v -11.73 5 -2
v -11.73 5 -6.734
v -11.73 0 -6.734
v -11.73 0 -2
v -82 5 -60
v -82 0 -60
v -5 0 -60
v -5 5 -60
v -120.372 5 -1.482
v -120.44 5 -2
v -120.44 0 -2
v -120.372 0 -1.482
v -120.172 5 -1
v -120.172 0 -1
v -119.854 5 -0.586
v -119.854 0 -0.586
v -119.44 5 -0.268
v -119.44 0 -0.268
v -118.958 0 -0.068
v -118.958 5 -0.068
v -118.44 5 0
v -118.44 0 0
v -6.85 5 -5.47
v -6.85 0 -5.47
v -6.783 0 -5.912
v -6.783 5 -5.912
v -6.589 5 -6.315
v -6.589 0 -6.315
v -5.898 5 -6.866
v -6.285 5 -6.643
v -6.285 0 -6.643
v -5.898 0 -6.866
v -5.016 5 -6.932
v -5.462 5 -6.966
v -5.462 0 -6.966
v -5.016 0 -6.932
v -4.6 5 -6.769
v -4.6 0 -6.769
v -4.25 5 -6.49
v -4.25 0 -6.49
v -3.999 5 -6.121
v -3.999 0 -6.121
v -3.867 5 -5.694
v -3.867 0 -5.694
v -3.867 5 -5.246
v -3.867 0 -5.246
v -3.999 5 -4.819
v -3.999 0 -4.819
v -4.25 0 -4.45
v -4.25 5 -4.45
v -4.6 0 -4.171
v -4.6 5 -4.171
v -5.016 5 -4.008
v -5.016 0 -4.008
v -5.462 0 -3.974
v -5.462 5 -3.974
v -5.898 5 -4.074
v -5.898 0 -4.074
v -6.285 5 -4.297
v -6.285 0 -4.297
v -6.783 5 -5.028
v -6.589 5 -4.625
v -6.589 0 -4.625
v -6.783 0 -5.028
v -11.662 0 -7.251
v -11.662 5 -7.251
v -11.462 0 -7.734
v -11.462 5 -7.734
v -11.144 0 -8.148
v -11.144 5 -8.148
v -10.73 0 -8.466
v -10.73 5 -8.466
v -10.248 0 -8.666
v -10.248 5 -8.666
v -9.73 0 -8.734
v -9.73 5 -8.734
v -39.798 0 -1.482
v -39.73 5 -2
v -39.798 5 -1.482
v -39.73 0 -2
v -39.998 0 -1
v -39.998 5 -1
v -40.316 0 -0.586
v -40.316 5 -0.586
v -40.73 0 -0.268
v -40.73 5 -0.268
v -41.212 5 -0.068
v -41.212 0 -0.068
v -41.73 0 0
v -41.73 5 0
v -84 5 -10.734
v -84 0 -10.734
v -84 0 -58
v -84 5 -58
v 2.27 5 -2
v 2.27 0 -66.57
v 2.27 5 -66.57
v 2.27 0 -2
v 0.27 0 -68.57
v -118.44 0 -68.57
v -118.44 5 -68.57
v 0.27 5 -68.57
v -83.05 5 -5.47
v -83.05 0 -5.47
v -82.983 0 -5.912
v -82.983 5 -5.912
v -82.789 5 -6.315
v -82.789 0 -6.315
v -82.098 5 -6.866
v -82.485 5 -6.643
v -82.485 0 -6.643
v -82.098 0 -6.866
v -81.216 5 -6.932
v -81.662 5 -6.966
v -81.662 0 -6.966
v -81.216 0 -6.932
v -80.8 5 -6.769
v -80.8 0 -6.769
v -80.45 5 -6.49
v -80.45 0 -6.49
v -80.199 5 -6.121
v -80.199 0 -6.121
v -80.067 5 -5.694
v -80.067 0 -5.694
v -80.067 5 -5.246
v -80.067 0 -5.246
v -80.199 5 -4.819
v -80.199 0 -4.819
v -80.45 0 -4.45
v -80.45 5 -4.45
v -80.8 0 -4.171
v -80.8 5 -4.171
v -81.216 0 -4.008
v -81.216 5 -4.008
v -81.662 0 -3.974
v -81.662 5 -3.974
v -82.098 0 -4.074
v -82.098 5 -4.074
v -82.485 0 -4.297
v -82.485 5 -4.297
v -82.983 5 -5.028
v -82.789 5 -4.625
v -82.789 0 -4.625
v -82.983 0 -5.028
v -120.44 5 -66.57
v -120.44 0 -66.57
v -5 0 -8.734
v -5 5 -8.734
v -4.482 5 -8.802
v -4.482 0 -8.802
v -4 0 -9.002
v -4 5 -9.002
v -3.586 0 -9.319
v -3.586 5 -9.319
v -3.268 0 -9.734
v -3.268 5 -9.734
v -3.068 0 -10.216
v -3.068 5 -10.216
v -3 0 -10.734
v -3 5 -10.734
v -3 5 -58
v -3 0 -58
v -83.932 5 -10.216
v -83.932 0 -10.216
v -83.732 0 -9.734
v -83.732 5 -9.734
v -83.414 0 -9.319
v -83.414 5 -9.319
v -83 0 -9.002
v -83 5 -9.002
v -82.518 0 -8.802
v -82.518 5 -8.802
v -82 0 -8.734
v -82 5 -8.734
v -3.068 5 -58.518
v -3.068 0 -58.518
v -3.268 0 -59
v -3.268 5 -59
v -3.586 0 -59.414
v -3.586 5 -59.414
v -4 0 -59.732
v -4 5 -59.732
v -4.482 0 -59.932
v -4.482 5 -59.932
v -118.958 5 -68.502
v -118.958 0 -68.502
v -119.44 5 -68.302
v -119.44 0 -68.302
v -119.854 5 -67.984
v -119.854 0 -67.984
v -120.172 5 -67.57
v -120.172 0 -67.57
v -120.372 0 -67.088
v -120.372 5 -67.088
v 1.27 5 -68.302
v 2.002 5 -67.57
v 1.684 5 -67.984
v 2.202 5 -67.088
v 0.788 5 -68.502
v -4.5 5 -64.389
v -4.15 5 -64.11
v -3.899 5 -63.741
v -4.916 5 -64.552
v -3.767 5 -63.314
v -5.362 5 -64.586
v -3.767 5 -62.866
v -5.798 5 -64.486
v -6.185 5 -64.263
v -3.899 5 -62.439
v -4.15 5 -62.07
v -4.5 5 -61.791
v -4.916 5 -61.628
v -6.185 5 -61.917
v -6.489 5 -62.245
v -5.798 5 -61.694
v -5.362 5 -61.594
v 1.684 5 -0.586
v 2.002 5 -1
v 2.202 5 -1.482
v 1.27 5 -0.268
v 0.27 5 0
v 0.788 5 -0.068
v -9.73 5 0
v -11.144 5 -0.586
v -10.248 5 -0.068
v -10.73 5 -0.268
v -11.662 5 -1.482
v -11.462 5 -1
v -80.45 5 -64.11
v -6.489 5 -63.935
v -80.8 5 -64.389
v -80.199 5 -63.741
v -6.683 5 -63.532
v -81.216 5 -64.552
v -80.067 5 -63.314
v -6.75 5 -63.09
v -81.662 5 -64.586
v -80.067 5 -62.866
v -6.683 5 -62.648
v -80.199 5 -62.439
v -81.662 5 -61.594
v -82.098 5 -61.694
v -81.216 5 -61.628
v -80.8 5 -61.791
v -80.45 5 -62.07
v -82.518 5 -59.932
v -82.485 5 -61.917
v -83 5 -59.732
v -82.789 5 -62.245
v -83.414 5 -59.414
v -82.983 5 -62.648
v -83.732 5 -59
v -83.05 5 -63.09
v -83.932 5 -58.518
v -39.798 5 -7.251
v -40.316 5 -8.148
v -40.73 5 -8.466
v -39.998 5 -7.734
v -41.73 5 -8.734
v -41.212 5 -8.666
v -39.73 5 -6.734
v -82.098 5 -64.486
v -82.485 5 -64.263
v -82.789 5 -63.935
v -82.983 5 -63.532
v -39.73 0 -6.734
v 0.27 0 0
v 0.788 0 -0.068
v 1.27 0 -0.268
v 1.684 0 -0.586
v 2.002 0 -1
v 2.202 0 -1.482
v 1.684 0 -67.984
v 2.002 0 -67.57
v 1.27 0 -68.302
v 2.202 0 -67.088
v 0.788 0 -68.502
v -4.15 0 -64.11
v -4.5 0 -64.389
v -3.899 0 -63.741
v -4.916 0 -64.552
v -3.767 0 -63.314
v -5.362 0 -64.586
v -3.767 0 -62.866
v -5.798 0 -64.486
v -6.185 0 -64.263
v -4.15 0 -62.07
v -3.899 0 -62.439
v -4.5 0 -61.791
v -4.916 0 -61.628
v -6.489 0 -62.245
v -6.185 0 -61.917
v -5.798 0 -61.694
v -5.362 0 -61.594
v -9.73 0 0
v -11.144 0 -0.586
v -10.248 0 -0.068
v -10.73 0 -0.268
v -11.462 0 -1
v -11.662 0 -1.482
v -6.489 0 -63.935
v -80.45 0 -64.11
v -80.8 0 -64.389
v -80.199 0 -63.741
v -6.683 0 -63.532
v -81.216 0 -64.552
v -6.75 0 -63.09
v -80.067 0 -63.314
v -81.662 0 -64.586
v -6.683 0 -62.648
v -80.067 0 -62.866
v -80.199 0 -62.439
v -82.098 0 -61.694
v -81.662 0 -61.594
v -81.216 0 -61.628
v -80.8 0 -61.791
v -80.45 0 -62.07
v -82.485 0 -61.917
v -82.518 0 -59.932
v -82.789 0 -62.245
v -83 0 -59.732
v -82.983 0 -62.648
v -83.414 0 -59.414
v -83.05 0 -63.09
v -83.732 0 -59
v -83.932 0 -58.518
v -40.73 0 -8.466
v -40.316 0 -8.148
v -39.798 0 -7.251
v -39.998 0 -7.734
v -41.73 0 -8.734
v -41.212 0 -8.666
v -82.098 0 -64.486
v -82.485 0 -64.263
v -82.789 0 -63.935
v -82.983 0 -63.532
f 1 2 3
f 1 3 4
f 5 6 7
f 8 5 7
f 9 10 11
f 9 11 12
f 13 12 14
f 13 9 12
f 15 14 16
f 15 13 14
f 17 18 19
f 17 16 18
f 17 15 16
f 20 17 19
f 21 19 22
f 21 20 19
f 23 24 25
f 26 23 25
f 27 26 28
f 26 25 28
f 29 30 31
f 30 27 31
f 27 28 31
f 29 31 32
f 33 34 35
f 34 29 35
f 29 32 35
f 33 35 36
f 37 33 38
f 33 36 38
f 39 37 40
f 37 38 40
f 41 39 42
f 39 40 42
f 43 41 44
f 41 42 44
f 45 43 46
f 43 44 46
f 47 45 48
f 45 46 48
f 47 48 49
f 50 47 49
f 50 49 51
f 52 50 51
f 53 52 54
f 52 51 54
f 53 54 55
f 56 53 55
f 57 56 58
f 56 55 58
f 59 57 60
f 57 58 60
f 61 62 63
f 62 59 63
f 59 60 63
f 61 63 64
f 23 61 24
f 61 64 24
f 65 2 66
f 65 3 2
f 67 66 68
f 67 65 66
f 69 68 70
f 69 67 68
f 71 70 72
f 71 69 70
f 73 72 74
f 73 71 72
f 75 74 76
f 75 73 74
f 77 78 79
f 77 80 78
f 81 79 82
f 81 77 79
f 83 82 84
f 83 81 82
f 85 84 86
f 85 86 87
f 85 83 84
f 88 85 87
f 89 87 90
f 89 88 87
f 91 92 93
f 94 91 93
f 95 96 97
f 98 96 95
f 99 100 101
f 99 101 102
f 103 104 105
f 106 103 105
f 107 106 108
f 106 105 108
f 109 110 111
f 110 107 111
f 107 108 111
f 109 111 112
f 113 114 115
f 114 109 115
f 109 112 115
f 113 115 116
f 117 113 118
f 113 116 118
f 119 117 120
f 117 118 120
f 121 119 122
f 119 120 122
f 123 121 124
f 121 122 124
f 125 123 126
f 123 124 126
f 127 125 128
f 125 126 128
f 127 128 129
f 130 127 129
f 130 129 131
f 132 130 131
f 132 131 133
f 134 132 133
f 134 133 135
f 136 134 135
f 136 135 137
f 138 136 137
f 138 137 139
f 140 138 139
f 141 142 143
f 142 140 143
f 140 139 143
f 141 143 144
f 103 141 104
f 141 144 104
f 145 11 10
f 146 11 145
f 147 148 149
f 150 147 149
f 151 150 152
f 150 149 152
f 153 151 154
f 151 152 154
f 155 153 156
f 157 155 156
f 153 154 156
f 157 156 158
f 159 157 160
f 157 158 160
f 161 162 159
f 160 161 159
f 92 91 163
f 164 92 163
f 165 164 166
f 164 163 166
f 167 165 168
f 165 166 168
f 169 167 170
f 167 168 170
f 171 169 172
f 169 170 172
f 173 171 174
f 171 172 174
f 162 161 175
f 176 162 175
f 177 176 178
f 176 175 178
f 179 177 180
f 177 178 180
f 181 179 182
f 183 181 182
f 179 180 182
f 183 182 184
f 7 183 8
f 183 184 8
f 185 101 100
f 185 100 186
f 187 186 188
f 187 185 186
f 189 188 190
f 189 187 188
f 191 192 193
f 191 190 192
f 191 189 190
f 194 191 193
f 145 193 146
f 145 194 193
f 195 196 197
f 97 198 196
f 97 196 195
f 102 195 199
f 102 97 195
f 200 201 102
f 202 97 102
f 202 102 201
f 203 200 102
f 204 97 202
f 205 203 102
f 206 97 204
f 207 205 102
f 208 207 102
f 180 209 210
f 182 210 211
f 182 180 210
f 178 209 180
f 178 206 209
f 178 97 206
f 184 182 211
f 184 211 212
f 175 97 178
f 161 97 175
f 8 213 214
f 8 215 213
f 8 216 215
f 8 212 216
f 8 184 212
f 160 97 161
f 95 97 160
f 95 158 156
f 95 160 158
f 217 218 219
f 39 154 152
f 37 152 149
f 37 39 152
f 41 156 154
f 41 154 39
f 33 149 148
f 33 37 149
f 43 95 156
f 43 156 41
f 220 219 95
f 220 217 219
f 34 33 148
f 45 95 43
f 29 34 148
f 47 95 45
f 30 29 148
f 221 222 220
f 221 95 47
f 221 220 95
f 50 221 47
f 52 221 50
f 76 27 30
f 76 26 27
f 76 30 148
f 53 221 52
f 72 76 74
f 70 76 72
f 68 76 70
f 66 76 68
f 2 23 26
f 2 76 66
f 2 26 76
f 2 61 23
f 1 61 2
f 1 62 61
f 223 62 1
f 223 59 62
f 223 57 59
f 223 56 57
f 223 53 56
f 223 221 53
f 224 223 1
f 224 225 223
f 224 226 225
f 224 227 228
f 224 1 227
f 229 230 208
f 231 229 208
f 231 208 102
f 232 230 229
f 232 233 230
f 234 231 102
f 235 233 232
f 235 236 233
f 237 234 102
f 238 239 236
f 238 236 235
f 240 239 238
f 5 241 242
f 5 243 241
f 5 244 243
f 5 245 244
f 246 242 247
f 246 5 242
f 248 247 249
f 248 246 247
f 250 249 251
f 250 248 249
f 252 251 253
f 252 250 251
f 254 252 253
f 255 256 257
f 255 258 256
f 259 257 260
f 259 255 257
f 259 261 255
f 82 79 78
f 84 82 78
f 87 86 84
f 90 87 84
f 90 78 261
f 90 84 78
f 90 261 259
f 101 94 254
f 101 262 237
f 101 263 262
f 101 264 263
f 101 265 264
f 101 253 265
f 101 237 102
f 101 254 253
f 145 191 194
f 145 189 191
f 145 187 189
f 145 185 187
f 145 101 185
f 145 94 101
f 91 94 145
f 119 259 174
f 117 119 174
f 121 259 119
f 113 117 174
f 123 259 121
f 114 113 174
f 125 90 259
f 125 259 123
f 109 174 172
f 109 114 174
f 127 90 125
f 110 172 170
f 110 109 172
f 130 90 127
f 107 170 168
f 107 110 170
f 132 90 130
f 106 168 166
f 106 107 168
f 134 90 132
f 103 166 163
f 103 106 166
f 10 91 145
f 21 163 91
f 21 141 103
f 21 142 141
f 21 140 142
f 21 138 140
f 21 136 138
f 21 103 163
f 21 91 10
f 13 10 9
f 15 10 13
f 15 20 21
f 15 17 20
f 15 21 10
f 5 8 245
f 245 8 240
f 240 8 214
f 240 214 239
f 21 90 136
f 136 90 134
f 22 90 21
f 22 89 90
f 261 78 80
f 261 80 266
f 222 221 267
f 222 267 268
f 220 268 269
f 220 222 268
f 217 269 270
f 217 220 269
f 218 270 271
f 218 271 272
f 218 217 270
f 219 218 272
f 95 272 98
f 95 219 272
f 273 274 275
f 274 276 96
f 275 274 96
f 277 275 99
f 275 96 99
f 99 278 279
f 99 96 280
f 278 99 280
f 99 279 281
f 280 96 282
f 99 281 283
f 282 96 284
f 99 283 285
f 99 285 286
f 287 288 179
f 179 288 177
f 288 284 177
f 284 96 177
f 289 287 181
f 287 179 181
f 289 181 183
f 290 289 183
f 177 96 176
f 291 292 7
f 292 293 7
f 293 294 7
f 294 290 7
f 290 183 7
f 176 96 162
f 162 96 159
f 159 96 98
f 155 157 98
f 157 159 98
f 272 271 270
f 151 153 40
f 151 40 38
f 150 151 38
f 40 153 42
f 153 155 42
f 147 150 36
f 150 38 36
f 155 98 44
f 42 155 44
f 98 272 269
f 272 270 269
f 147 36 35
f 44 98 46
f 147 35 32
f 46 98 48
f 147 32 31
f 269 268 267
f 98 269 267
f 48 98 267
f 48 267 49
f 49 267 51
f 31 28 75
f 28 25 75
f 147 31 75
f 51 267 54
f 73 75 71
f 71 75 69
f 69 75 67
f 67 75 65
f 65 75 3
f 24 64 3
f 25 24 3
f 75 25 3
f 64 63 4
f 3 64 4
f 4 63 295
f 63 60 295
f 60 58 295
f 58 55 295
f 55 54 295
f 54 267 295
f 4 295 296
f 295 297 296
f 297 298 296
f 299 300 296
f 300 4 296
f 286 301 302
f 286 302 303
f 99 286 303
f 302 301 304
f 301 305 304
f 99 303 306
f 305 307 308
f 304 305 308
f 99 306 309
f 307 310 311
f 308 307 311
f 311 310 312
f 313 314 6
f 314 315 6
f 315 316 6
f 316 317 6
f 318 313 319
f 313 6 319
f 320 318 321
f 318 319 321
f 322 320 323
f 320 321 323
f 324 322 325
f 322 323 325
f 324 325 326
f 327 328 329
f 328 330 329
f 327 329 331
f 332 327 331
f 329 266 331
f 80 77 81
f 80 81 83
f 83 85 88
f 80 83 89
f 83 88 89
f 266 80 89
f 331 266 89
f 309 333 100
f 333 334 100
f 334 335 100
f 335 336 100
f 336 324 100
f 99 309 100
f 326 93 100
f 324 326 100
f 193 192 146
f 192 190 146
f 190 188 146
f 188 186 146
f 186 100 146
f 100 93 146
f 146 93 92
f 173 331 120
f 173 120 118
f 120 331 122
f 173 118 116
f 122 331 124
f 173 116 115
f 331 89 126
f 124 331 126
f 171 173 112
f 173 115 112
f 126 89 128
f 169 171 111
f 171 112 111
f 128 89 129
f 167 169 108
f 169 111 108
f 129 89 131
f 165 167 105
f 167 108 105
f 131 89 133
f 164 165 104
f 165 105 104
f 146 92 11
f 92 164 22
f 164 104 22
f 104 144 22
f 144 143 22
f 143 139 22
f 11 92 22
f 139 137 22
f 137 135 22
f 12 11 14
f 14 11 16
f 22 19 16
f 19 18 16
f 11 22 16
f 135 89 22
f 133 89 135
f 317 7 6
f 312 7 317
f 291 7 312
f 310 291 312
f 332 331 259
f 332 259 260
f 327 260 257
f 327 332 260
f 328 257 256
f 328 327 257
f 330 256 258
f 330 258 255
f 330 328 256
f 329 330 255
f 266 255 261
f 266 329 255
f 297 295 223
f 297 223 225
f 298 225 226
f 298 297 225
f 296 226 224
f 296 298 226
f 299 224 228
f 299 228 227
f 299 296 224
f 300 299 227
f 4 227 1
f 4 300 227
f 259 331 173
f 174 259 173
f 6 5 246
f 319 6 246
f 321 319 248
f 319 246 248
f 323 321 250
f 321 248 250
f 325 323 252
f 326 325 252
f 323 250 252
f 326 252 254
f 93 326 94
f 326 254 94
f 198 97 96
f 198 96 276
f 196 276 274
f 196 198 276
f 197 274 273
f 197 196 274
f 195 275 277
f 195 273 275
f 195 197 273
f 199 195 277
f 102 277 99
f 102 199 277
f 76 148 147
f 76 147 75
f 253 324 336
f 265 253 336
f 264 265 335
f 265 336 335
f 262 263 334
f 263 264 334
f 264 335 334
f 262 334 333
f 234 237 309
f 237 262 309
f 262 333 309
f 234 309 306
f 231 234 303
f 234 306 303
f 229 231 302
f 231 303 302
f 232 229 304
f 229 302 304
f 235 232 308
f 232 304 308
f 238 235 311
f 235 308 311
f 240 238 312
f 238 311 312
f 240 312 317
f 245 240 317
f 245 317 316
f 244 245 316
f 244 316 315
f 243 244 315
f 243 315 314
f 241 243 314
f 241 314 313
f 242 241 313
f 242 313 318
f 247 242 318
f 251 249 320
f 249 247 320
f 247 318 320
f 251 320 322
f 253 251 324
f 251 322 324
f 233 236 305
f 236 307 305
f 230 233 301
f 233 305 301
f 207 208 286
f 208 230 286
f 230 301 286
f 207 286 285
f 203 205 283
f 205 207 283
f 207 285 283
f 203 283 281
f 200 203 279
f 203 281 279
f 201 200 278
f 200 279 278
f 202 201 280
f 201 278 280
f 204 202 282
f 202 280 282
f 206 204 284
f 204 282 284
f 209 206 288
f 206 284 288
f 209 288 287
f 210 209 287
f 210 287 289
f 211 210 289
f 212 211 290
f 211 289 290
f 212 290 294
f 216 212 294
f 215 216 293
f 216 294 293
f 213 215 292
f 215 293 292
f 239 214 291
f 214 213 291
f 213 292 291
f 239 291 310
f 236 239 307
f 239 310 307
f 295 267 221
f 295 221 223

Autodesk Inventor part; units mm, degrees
ref_plane "YZ Plane" through (0, 0, 0) normal (1, 0, 0) x (0, 1, 0)
ref_plane "XZ Plane" through (0, 0, 0) normal (0, 1, 0) x (-1, 0, 0)
ref_plane "XY Plane" through (0, 0, 0) normal (0, 0, 1) x (1, 0, 0)
sketch "Sketch1" plane through (0, 0, 0) normal (0, 1, 0) x (-1, 0, 0)
  line L0 (-2.27, 0) -> (120.44, 0)
  line L1 (120.44, 0) -> (120.44, -68.57)
  line L2 (120.44, -68.57) -> (-2.27, -68.57)
  line L3 (-2.27, -68.57) -> (-2.27, 0)
  line L4 (120.44, -66.57) -> (120.44, -2)
  line L5 (0, -68.57) -> (118.44, -68.57)
  line L6 (-2.27, -2.27) -> (-2.27, -66.3)
  circle A0 centre (81.55, -63.09) radius 1.5
  circle A1 centre (81.55, -63.09) radius 1.5
  line L7 (70.44, -68.57) -> (15.73, -68.57)
  line L8 (51, 0) -> (75, 0)
  line L9 (26, 0) -> (51, 0)
  line L10 (84, -60) -> (79, -60)
  line L11 (79, -60) -> (79, -8.7337)
  line L12 (79, -8.7337) -> (84, -8.7337)
  line L13 (84, -8.7337) -> (84, -60)
  line L14 (8, -60) -> (3, -60)
  line L15 (3, -60) -> (3, -8.7337)
  line L16 (3, -8.7337) -> (8, -8.7337)
  line L17 (8, -8.7337) -> (8, -60)
  circle A2 centre (5.25, -63.09) radius 1.5
  circle A3 centre (5.35, -5.47) radius 1.5
  circle A4 centre (81.55, -5.47) radius 1.5
  circle A5 centre (81.55, -5.47) radius 1.5
  circle A6 centre (5.35, -5.47) radius 1.5
  circle A7 centre (5.25, -63.09) radius 1.5
  dimension "d20" = 3
  dimension "d27" = 3
  dimension "d28" = 3
  dimension "d29" = 3
  dimension "d30" = 68.57
extrude "Extrusion1" add sketch "Sketch1" along normal blind 5
fillet "Fillet4" radius 2 4 edges at (-120.44, 2.5, -68.57) (-120.44, 2.5, 0) (2.27, 2.5, -68.57) (2.27, 2.5, 0)
sketch "Sketch7" plane through (0, 5, 0) normal (0, 1, 0) x (1, 0, 0)
  line L0 (-117.44, 63.57) -> (-87.44, 63.57)
  line L1 (-87.44, 63.57) -> (-87.44, 5)
  line L2 (-87.44, 5) -> (-117.44, 5)
  line L3 (-117.44, 5) -> (-117.44, 63.57)
  line L4 (-120.44, 66.57) -> (-120.44, 2) projected
  line L5 (0.27, 68.57) -> (-118.44, 68.57) projected
  line L6 (-118.44, 0) -> (0.27, 0) projected
  point P0 (0, 0)
  dimension "d67" = 30
  dimension "d68" = 3
  dimension "d69" = 5
  dimension "d70" = 5
extrude "Extrusion6" [suppressed]
fillet "Fillet8" [suppressed]
sketch "Sketch8" plane through (0, 5, 0) normal (0, 1, 0) x (1, 0, 0)
  line L0 (-79, 60) -> (-8, 60)
  line L1 (-8, 60) -> (-8, 8.7337)
  line L2 (-8, 8.7337) -> (-79, 8.7337)
  line L3 (-79, 8.7337) -> (-79, 60)
  line L4 (-8, 8.7337) -> (-8, 60) projected
  line L5 (0.27, 68.57) -> (-118.44, 68.57) projected
  line L6 (-79, 60) -> (-79, 8.7337) projected
  line L7 (-3, 8.7337) -> (-8, 8.7337) projected
  line L8 (-8, 60) -> (-3, 60) projected
  point P0 (0, 0)
extrude "Extrusion7" cut sketch "Sketch8" against normal blind 10
sketch "Sketch9" plane through (0, 5, 0) normal (0, 1, 0) x (1, 0, 0)
  line L0 (-3, 8.7337) -> (-84, 8.7337) projected
  line L1 (-118.44, 0) -> (0.27, 0) projected
  line L2 (-39.73, 8.7337) -> (-11.73, 8.7337)
  line L3 (-11.73, 8.7337) -> (-11.73, 0)
  line L4 (-11.73, 0) -> (-39.73, 0)
  line L5 (-39.73, 0) -> (-39.73, 8.7337)
  line L6 (2.27, 2) -> (2.27, 66.57) projected
  point P0 (0, 0)
  point P1 (-79, 8.57)
  point P2 (-8, 8.57)
  point P3 (-39.73, 0)
  point P4 (-11.73, 8.57)
  point P5 (-11.73, 8.7337)
  point P6 (-79, 8.871)
  point P7 (-8, 8.871)
  point P8 (-11.73, 8.871)
  point P9 (-11.73, 8.7337)
  dimension "d78" = 28
  dimension "d81" = 14
  dimension "d82" = 8.7338
extrude "Extrusion8" cut sketch "Sketch9" against normal blind 5
fillet "Fillet9" radius 2 8 edges at (-84, 2.5, -60) (-3, 2.5, -60) (-3, 2.5, -8.7337) (-11.73, 2.5, -8.7337) (-11.73, 2.5, 0) (-39.73, 2.5, -8.7337) (-39.73, 2.5, 0) (-84, 2.5, -8.7337)
properties part number "Top PMMA"
